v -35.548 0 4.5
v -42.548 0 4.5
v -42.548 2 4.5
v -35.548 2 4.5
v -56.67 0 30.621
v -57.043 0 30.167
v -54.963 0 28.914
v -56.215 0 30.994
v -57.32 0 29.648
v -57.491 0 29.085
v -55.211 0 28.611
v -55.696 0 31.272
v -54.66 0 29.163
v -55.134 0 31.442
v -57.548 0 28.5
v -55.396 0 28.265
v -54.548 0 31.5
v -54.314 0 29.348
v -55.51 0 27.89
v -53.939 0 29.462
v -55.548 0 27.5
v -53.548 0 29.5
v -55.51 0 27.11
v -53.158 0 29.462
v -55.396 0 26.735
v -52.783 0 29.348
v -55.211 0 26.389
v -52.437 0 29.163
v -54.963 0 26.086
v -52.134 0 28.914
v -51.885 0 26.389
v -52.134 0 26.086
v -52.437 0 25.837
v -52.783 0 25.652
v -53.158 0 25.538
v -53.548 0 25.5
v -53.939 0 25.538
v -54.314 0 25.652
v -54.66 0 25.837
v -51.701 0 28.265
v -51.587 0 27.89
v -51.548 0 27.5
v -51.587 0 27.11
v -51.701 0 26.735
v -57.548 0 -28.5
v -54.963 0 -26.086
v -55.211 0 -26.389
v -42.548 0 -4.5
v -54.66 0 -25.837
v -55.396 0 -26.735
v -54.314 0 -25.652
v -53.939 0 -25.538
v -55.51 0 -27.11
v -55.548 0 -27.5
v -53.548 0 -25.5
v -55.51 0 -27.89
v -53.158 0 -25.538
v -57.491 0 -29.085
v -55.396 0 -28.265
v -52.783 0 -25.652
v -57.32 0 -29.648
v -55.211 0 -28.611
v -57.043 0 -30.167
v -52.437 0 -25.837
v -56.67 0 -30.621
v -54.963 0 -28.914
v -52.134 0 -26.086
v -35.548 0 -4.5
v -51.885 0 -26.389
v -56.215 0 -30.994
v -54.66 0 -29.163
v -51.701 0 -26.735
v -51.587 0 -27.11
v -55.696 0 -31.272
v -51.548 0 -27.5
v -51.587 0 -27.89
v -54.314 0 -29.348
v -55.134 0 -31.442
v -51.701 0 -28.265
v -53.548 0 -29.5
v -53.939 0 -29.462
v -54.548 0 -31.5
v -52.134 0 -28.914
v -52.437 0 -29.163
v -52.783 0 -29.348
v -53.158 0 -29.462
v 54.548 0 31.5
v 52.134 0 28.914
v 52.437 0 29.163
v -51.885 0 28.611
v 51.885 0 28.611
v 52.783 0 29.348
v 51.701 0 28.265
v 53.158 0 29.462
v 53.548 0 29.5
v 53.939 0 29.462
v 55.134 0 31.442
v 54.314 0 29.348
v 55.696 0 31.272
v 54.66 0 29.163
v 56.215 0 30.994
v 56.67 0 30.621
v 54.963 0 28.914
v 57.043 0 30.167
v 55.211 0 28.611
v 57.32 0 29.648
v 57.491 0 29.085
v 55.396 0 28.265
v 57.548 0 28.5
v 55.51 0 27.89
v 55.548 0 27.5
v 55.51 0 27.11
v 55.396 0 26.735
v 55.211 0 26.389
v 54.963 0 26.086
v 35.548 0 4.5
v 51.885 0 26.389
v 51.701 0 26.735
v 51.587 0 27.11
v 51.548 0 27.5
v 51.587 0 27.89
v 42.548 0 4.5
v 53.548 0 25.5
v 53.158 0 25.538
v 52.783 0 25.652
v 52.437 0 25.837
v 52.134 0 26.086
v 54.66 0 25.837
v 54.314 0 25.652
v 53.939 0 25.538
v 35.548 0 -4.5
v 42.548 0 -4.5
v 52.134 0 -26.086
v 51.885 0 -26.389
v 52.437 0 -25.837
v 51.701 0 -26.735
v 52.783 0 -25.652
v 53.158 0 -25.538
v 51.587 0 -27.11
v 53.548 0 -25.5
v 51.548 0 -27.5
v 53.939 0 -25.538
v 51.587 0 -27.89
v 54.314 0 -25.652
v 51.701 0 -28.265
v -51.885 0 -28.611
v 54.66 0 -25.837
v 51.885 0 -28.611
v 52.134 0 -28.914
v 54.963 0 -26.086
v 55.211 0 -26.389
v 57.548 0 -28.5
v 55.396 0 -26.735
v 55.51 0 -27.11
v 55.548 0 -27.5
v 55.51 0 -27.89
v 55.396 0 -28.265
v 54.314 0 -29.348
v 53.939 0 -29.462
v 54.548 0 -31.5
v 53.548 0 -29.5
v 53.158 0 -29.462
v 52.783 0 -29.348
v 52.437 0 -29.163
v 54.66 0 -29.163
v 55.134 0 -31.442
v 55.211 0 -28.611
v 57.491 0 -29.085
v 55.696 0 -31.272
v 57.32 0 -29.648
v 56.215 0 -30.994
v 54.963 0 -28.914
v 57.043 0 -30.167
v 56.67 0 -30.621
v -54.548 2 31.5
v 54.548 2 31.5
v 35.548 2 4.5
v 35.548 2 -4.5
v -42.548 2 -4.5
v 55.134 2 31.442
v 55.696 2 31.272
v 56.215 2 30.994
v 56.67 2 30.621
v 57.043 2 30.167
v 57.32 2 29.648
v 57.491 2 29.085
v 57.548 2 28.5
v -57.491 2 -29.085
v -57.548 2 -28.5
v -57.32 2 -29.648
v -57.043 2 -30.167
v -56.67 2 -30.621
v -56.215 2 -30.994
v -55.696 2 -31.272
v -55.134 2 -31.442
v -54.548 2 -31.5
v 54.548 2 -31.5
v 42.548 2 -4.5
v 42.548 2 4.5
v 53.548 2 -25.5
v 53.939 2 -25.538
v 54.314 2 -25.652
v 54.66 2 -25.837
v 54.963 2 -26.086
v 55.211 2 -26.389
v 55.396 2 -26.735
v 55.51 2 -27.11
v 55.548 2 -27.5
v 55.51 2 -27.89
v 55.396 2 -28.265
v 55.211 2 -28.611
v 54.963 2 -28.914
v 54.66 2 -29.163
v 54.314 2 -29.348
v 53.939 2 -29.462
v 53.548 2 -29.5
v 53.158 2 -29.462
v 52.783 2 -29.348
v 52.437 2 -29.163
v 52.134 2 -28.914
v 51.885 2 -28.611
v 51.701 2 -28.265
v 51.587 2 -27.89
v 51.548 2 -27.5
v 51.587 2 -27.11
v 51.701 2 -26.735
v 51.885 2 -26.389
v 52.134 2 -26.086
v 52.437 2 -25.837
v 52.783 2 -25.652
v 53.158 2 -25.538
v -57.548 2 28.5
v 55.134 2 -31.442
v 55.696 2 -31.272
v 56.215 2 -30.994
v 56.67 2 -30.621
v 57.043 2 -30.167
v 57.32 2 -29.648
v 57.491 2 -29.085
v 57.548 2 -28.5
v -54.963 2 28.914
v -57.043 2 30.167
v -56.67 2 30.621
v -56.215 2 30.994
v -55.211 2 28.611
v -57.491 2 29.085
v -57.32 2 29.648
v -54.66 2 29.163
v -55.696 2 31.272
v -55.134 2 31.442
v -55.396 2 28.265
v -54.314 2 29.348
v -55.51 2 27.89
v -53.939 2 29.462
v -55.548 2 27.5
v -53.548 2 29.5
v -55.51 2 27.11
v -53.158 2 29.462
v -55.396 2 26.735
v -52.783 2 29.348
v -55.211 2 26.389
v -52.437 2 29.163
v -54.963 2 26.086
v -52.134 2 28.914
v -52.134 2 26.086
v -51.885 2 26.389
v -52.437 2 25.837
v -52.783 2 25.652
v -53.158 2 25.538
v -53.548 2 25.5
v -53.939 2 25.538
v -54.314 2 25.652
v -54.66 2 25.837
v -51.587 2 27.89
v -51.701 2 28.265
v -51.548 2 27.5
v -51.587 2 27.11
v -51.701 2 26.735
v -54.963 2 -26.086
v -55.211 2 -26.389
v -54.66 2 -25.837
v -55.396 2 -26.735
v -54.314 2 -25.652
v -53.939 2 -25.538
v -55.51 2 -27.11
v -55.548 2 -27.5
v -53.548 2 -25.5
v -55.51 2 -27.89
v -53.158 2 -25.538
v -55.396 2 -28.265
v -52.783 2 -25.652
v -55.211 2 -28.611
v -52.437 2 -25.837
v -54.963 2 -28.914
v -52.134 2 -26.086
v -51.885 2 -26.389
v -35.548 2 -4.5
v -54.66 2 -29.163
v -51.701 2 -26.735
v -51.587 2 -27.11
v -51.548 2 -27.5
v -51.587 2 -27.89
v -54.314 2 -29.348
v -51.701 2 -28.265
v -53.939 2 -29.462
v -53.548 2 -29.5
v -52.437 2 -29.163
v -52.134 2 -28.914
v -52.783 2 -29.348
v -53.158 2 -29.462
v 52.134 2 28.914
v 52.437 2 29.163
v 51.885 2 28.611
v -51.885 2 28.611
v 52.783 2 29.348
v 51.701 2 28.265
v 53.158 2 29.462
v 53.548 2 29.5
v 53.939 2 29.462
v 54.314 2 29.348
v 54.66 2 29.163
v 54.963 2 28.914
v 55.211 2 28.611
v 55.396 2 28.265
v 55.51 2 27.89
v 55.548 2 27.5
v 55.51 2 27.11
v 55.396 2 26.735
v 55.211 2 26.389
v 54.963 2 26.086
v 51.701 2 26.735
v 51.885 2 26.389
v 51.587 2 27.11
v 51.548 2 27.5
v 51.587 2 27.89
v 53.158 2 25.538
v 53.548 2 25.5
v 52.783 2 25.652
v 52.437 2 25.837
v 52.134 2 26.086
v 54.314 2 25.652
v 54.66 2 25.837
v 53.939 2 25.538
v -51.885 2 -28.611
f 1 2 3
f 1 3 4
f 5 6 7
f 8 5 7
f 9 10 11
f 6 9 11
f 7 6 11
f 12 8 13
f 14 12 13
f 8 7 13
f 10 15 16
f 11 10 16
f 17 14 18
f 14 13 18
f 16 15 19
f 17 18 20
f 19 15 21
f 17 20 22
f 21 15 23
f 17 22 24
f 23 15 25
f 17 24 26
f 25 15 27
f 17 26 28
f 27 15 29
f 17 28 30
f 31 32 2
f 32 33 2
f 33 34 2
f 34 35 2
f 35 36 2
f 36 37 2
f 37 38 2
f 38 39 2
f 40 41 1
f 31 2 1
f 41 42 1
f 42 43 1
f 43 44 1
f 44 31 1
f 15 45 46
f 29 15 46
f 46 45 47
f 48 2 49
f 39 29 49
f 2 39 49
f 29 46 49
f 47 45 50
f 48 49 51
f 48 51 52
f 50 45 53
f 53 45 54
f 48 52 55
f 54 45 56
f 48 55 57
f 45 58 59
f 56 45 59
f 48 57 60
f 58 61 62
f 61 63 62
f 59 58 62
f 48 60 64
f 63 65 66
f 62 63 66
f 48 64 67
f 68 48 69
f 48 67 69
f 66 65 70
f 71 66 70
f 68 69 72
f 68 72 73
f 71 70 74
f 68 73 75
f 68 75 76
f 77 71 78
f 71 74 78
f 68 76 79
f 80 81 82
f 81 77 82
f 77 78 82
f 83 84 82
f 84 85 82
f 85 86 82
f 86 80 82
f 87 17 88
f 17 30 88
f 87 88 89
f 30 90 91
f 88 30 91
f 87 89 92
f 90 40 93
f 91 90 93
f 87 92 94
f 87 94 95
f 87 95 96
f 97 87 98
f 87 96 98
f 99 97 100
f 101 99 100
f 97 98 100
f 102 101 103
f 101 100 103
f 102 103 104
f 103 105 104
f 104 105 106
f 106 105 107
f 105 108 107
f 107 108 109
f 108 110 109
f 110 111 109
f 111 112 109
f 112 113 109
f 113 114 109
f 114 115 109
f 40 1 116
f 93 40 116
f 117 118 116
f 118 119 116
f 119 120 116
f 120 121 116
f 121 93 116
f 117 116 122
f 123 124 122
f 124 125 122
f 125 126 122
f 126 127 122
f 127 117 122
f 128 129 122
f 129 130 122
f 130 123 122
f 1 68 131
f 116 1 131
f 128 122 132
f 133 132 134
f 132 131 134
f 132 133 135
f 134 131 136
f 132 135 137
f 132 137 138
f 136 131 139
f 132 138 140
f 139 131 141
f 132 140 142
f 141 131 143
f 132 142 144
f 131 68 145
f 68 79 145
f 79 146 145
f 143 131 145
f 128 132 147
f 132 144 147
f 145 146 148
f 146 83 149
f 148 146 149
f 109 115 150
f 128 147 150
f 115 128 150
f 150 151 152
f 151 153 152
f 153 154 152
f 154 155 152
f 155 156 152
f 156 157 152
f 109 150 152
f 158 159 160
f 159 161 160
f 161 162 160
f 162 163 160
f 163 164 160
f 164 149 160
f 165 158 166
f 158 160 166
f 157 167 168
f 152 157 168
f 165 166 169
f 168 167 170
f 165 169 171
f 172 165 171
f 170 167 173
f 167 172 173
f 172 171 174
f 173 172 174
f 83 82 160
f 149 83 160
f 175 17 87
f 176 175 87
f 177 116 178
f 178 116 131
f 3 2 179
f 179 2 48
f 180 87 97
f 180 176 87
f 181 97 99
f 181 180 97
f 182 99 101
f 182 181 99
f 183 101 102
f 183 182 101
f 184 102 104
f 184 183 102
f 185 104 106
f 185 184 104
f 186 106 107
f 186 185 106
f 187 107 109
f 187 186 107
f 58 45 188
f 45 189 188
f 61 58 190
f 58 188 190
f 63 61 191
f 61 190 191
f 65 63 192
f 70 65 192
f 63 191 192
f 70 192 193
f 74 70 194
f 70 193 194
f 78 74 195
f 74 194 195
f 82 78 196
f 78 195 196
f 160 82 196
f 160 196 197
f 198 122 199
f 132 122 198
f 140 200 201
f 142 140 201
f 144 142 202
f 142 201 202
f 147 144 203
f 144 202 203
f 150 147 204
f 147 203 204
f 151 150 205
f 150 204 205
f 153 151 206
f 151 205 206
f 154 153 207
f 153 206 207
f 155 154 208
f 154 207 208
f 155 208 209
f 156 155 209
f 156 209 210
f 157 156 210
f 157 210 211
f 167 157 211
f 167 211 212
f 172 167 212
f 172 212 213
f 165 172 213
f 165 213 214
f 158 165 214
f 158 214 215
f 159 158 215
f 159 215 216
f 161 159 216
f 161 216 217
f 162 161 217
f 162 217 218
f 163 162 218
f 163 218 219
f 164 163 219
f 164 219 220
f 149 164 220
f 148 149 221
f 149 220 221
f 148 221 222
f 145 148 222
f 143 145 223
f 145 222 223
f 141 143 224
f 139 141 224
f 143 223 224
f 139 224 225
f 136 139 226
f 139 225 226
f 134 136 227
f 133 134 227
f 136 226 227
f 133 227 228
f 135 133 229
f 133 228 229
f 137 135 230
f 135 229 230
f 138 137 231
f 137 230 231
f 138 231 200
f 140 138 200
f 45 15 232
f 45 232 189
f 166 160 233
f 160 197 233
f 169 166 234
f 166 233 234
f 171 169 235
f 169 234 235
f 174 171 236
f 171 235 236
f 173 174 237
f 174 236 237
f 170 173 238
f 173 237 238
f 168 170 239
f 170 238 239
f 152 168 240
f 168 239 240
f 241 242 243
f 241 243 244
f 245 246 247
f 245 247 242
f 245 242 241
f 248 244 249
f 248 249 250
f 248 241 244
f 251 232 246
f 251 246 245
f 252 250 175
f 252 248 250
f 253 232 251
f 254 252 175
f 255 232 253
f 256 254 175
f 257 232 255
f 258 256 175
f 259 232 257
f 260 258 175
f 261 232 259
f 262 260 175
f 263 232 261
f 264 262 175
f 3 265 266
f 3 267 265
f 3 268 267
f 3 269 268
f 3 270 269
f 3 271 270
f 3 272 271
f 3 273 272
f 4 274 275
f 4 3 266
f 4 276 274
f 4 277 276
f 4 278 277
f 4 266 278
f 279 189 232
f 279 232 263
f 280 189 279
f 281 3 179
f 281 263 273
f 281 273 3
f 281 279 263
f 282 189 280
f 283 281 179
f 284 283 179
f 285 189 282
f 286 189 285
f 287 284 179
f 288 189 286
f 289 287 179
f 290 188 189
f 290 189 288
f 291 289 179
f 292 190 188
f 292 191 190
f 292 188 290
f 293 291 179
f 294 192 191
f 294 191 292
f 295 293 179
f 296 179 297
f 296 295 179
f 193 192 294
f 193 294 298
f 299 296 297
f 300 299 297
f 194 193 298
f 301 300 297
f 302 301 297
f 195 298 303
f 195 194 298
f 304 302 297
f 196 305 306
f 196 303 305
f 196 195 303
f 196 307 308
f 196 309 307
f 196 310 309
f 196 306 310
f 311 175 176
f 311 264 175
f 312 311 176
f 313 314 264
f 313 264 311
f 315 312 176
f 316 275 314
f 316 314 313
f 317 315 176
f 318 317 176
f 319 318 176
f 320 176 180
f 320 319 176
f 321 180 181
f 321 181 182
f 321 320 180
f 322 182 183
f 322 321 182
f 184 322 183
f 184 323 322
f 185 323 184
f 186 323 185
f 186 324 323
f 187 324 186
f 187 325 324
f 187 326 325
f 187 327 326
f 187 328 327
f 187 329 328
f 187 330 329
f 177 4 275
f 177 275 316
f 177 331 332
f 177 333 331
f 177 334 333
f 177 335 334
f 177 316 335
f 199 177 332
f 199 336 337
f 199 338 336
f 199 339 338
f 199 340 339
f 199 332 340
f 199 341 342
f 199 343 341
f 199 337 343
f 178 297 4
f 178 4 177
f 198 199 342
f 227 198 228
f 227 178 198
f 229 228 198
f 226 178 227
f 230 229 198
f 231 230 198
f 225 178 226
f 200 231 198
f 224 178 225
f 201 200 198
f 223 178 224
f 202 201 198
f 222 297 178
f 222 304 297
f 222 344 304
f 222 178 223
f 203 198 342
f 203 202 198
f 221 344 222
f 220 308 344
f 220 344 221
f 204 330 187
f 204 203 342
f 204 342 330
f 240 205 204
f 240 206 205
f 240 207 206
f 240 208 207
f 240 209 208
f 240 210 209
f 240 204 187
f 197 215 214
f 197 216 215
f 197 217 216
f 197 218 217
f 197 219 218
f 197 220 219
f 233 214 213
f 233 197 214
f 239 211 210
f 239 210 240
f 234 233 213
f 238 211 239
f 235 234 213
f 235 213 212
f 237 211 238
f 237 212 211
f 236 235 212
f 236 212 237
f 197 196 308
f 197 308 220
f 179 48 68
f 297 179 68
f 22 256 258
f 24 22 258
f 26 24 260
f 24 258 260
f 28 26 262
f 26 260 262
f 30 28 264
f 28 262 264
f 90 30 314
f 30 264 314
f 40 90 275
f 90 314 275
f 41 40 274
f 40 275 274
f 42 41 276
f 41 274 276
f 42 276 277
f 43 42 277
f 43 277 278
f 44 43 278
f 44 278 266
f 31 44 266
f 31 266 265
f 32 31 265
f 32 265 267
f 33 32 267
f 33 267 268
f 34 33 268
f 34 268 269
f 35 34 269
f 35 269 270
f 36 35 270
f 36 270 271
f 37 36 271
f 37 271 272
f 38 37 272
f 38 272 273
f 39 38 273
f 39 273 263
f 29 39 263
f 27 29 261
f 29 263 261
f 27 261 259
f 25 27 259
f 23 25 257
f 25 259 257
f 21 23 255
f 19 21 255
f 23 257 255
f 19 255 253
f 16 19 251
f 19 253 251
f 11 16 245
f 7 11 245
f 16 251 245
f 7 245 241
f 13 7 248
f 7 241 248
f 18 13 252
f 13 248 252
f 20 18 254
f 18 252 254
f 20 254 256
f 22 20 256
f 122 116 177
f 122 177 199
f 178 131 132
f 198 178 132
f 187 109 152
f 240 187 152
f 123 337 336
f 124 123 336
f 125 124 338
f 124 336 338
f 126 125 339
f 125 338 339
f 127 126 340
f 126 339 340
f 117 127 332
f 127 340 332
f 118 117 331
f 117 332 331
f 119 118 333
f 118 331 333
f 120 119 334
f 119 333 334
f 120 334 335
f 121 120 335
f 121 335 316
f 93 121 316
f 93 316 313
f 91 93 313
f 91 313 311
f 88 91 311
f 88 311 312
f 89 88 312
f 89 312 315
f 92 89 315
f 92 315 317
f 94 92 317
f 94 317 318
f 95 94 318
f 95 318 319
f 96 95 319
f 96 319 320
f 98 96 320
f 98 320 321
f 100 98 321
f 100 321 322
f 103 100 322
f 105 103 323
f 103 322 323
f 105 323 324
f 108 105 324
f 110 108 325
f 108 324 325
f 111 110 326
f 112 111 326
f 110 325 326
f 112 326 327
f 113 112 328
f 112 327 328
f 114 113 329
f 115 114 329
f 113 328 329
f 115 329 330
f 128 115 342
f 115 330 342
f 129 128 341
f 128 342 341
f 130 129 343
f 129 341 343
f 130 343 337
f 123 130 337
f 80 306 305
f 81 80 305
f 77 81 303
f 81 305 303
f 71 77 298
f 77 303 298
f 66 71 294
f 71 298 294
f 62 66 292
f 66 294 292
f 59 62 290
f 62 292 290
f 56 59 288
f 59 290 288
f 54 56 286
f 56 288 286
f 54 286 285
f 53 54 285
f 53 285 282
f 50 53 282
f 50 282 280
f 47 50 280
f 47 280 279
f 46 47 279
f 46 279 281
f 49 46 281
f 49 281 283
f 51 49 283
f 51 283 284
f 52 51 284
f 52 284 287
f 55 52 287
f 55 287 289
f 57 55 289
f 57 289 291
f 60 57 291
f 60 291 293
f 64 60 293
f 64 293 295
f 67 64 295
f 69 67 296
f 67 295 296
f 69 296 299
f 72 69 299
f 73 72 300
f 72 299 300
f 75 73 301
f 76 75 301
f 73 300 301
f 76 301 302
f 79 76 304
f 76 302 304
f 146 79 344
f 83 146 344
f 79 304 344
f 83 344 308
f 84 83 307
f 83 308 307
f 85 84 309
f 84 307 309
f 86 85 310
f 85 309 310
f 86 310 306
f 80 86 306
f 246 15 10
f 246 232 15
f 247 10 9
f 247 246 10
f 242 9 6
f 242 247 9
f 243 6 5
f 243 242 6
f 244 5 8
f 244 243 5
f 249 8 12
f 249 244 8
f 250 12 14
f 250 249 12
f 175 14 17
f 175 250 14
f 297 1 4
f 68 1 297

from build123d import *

# Parameters (mm, degrees)
ESBO_O1_W                  = 115.09677689
ESBO_O1_H                  = 63
RESSALTO_EXTRUS_O1_DEPTH   = 2
ESBO_O5_R                  = 2
CORTE_EXTRUS_O3_DEPTH      = 66.635866816
FILETE1_R                  = 3
CORTE_EXTRUS_O4_DEPTH      = 66.635866816
CORTE_EXTRUS_O4_DEPTH_BACK = 66.635866816
ESBO_O6_W                  = 7
ESBO_O6_H                  = 9


with BuildPart() as part:
    # Esboço1 → Ressalto-extrusão1 (new body)
    with BuildSketch(Plane(origin=(0, 0, 0), x_dir=(1, 0, 0), z_dir=(0, 1, 0))):
        Rectangle(ESBO_O1_W, ESBO_O1_H)
    extrude(amount=RESSALTO_EXTRUS_O1_DEPTH)

    # Esboço5 → Corte-extrusão3 (cut, through all)
    with BuildSketch(Plane(origin=(0, 2, 0), x_dir=(1, 0, 0), z_dir=(0, 1, 0))):
        with Locations(Location((53.548388445, 27.5, 0), (0, 0, 270))):
            Circle(ESBO_O5_R)
        with Locations(Location((53.548388445, -27.5, 0), (0, 0, 90))):
            Circle(ESBO_O5_R)
        with Locations(Location((-53.548388445, -27.5, 0), (0, 0, 270))):
            Circle(ESBO_O5_R)
        with Locations(Location((-53.548388445, 27.5, 0), (0, 0, 90))):
            Circle(ESBO_O5_R)
    extrude(amount=-CORTE_EXTRUS_O3_DEPTH, mode=Mode.SUBTRACT)

    # Filete1
    filete1_edges = [part.edges().sort_by_distance(p)[0] for p in [
        (-57.548388445, 1, -31.5),
        (57.548388445, 1, -31.5),
        (57.548388445, 1, 31.5),
        (-57.548388445, 1, 31.5),
    ]]
    fillet(filete1_edges, radius=FILETE1_R)

    # Esboço6 → Corte-extrusão4 (cut, two sides: drawn at the far end of the back side and taken through both)
    with BuildSketch(Plane(origin=(0, 2, 0), x_dir=(1, 0, 0), z_dir=(0, 1, 0)).offset(-CORTE_EXTRUS_O4_DEPTH_BACK)):
        with Locations((-39.048388445, 0)):
            Rectangle(ESBO_O6_W, ESBO_O6_H)
        with Locations((39.048388445, 0)):
            Rectangle(ESBO_O6_W, ESBO_O6_H)
    extrude(amount=CORTE_EXTRUS_O4_DEPTH + CORTE_EXTRUS_O4_DEPTH_BACK, mode=Mode.SUBTRACT)


solid = part.part
